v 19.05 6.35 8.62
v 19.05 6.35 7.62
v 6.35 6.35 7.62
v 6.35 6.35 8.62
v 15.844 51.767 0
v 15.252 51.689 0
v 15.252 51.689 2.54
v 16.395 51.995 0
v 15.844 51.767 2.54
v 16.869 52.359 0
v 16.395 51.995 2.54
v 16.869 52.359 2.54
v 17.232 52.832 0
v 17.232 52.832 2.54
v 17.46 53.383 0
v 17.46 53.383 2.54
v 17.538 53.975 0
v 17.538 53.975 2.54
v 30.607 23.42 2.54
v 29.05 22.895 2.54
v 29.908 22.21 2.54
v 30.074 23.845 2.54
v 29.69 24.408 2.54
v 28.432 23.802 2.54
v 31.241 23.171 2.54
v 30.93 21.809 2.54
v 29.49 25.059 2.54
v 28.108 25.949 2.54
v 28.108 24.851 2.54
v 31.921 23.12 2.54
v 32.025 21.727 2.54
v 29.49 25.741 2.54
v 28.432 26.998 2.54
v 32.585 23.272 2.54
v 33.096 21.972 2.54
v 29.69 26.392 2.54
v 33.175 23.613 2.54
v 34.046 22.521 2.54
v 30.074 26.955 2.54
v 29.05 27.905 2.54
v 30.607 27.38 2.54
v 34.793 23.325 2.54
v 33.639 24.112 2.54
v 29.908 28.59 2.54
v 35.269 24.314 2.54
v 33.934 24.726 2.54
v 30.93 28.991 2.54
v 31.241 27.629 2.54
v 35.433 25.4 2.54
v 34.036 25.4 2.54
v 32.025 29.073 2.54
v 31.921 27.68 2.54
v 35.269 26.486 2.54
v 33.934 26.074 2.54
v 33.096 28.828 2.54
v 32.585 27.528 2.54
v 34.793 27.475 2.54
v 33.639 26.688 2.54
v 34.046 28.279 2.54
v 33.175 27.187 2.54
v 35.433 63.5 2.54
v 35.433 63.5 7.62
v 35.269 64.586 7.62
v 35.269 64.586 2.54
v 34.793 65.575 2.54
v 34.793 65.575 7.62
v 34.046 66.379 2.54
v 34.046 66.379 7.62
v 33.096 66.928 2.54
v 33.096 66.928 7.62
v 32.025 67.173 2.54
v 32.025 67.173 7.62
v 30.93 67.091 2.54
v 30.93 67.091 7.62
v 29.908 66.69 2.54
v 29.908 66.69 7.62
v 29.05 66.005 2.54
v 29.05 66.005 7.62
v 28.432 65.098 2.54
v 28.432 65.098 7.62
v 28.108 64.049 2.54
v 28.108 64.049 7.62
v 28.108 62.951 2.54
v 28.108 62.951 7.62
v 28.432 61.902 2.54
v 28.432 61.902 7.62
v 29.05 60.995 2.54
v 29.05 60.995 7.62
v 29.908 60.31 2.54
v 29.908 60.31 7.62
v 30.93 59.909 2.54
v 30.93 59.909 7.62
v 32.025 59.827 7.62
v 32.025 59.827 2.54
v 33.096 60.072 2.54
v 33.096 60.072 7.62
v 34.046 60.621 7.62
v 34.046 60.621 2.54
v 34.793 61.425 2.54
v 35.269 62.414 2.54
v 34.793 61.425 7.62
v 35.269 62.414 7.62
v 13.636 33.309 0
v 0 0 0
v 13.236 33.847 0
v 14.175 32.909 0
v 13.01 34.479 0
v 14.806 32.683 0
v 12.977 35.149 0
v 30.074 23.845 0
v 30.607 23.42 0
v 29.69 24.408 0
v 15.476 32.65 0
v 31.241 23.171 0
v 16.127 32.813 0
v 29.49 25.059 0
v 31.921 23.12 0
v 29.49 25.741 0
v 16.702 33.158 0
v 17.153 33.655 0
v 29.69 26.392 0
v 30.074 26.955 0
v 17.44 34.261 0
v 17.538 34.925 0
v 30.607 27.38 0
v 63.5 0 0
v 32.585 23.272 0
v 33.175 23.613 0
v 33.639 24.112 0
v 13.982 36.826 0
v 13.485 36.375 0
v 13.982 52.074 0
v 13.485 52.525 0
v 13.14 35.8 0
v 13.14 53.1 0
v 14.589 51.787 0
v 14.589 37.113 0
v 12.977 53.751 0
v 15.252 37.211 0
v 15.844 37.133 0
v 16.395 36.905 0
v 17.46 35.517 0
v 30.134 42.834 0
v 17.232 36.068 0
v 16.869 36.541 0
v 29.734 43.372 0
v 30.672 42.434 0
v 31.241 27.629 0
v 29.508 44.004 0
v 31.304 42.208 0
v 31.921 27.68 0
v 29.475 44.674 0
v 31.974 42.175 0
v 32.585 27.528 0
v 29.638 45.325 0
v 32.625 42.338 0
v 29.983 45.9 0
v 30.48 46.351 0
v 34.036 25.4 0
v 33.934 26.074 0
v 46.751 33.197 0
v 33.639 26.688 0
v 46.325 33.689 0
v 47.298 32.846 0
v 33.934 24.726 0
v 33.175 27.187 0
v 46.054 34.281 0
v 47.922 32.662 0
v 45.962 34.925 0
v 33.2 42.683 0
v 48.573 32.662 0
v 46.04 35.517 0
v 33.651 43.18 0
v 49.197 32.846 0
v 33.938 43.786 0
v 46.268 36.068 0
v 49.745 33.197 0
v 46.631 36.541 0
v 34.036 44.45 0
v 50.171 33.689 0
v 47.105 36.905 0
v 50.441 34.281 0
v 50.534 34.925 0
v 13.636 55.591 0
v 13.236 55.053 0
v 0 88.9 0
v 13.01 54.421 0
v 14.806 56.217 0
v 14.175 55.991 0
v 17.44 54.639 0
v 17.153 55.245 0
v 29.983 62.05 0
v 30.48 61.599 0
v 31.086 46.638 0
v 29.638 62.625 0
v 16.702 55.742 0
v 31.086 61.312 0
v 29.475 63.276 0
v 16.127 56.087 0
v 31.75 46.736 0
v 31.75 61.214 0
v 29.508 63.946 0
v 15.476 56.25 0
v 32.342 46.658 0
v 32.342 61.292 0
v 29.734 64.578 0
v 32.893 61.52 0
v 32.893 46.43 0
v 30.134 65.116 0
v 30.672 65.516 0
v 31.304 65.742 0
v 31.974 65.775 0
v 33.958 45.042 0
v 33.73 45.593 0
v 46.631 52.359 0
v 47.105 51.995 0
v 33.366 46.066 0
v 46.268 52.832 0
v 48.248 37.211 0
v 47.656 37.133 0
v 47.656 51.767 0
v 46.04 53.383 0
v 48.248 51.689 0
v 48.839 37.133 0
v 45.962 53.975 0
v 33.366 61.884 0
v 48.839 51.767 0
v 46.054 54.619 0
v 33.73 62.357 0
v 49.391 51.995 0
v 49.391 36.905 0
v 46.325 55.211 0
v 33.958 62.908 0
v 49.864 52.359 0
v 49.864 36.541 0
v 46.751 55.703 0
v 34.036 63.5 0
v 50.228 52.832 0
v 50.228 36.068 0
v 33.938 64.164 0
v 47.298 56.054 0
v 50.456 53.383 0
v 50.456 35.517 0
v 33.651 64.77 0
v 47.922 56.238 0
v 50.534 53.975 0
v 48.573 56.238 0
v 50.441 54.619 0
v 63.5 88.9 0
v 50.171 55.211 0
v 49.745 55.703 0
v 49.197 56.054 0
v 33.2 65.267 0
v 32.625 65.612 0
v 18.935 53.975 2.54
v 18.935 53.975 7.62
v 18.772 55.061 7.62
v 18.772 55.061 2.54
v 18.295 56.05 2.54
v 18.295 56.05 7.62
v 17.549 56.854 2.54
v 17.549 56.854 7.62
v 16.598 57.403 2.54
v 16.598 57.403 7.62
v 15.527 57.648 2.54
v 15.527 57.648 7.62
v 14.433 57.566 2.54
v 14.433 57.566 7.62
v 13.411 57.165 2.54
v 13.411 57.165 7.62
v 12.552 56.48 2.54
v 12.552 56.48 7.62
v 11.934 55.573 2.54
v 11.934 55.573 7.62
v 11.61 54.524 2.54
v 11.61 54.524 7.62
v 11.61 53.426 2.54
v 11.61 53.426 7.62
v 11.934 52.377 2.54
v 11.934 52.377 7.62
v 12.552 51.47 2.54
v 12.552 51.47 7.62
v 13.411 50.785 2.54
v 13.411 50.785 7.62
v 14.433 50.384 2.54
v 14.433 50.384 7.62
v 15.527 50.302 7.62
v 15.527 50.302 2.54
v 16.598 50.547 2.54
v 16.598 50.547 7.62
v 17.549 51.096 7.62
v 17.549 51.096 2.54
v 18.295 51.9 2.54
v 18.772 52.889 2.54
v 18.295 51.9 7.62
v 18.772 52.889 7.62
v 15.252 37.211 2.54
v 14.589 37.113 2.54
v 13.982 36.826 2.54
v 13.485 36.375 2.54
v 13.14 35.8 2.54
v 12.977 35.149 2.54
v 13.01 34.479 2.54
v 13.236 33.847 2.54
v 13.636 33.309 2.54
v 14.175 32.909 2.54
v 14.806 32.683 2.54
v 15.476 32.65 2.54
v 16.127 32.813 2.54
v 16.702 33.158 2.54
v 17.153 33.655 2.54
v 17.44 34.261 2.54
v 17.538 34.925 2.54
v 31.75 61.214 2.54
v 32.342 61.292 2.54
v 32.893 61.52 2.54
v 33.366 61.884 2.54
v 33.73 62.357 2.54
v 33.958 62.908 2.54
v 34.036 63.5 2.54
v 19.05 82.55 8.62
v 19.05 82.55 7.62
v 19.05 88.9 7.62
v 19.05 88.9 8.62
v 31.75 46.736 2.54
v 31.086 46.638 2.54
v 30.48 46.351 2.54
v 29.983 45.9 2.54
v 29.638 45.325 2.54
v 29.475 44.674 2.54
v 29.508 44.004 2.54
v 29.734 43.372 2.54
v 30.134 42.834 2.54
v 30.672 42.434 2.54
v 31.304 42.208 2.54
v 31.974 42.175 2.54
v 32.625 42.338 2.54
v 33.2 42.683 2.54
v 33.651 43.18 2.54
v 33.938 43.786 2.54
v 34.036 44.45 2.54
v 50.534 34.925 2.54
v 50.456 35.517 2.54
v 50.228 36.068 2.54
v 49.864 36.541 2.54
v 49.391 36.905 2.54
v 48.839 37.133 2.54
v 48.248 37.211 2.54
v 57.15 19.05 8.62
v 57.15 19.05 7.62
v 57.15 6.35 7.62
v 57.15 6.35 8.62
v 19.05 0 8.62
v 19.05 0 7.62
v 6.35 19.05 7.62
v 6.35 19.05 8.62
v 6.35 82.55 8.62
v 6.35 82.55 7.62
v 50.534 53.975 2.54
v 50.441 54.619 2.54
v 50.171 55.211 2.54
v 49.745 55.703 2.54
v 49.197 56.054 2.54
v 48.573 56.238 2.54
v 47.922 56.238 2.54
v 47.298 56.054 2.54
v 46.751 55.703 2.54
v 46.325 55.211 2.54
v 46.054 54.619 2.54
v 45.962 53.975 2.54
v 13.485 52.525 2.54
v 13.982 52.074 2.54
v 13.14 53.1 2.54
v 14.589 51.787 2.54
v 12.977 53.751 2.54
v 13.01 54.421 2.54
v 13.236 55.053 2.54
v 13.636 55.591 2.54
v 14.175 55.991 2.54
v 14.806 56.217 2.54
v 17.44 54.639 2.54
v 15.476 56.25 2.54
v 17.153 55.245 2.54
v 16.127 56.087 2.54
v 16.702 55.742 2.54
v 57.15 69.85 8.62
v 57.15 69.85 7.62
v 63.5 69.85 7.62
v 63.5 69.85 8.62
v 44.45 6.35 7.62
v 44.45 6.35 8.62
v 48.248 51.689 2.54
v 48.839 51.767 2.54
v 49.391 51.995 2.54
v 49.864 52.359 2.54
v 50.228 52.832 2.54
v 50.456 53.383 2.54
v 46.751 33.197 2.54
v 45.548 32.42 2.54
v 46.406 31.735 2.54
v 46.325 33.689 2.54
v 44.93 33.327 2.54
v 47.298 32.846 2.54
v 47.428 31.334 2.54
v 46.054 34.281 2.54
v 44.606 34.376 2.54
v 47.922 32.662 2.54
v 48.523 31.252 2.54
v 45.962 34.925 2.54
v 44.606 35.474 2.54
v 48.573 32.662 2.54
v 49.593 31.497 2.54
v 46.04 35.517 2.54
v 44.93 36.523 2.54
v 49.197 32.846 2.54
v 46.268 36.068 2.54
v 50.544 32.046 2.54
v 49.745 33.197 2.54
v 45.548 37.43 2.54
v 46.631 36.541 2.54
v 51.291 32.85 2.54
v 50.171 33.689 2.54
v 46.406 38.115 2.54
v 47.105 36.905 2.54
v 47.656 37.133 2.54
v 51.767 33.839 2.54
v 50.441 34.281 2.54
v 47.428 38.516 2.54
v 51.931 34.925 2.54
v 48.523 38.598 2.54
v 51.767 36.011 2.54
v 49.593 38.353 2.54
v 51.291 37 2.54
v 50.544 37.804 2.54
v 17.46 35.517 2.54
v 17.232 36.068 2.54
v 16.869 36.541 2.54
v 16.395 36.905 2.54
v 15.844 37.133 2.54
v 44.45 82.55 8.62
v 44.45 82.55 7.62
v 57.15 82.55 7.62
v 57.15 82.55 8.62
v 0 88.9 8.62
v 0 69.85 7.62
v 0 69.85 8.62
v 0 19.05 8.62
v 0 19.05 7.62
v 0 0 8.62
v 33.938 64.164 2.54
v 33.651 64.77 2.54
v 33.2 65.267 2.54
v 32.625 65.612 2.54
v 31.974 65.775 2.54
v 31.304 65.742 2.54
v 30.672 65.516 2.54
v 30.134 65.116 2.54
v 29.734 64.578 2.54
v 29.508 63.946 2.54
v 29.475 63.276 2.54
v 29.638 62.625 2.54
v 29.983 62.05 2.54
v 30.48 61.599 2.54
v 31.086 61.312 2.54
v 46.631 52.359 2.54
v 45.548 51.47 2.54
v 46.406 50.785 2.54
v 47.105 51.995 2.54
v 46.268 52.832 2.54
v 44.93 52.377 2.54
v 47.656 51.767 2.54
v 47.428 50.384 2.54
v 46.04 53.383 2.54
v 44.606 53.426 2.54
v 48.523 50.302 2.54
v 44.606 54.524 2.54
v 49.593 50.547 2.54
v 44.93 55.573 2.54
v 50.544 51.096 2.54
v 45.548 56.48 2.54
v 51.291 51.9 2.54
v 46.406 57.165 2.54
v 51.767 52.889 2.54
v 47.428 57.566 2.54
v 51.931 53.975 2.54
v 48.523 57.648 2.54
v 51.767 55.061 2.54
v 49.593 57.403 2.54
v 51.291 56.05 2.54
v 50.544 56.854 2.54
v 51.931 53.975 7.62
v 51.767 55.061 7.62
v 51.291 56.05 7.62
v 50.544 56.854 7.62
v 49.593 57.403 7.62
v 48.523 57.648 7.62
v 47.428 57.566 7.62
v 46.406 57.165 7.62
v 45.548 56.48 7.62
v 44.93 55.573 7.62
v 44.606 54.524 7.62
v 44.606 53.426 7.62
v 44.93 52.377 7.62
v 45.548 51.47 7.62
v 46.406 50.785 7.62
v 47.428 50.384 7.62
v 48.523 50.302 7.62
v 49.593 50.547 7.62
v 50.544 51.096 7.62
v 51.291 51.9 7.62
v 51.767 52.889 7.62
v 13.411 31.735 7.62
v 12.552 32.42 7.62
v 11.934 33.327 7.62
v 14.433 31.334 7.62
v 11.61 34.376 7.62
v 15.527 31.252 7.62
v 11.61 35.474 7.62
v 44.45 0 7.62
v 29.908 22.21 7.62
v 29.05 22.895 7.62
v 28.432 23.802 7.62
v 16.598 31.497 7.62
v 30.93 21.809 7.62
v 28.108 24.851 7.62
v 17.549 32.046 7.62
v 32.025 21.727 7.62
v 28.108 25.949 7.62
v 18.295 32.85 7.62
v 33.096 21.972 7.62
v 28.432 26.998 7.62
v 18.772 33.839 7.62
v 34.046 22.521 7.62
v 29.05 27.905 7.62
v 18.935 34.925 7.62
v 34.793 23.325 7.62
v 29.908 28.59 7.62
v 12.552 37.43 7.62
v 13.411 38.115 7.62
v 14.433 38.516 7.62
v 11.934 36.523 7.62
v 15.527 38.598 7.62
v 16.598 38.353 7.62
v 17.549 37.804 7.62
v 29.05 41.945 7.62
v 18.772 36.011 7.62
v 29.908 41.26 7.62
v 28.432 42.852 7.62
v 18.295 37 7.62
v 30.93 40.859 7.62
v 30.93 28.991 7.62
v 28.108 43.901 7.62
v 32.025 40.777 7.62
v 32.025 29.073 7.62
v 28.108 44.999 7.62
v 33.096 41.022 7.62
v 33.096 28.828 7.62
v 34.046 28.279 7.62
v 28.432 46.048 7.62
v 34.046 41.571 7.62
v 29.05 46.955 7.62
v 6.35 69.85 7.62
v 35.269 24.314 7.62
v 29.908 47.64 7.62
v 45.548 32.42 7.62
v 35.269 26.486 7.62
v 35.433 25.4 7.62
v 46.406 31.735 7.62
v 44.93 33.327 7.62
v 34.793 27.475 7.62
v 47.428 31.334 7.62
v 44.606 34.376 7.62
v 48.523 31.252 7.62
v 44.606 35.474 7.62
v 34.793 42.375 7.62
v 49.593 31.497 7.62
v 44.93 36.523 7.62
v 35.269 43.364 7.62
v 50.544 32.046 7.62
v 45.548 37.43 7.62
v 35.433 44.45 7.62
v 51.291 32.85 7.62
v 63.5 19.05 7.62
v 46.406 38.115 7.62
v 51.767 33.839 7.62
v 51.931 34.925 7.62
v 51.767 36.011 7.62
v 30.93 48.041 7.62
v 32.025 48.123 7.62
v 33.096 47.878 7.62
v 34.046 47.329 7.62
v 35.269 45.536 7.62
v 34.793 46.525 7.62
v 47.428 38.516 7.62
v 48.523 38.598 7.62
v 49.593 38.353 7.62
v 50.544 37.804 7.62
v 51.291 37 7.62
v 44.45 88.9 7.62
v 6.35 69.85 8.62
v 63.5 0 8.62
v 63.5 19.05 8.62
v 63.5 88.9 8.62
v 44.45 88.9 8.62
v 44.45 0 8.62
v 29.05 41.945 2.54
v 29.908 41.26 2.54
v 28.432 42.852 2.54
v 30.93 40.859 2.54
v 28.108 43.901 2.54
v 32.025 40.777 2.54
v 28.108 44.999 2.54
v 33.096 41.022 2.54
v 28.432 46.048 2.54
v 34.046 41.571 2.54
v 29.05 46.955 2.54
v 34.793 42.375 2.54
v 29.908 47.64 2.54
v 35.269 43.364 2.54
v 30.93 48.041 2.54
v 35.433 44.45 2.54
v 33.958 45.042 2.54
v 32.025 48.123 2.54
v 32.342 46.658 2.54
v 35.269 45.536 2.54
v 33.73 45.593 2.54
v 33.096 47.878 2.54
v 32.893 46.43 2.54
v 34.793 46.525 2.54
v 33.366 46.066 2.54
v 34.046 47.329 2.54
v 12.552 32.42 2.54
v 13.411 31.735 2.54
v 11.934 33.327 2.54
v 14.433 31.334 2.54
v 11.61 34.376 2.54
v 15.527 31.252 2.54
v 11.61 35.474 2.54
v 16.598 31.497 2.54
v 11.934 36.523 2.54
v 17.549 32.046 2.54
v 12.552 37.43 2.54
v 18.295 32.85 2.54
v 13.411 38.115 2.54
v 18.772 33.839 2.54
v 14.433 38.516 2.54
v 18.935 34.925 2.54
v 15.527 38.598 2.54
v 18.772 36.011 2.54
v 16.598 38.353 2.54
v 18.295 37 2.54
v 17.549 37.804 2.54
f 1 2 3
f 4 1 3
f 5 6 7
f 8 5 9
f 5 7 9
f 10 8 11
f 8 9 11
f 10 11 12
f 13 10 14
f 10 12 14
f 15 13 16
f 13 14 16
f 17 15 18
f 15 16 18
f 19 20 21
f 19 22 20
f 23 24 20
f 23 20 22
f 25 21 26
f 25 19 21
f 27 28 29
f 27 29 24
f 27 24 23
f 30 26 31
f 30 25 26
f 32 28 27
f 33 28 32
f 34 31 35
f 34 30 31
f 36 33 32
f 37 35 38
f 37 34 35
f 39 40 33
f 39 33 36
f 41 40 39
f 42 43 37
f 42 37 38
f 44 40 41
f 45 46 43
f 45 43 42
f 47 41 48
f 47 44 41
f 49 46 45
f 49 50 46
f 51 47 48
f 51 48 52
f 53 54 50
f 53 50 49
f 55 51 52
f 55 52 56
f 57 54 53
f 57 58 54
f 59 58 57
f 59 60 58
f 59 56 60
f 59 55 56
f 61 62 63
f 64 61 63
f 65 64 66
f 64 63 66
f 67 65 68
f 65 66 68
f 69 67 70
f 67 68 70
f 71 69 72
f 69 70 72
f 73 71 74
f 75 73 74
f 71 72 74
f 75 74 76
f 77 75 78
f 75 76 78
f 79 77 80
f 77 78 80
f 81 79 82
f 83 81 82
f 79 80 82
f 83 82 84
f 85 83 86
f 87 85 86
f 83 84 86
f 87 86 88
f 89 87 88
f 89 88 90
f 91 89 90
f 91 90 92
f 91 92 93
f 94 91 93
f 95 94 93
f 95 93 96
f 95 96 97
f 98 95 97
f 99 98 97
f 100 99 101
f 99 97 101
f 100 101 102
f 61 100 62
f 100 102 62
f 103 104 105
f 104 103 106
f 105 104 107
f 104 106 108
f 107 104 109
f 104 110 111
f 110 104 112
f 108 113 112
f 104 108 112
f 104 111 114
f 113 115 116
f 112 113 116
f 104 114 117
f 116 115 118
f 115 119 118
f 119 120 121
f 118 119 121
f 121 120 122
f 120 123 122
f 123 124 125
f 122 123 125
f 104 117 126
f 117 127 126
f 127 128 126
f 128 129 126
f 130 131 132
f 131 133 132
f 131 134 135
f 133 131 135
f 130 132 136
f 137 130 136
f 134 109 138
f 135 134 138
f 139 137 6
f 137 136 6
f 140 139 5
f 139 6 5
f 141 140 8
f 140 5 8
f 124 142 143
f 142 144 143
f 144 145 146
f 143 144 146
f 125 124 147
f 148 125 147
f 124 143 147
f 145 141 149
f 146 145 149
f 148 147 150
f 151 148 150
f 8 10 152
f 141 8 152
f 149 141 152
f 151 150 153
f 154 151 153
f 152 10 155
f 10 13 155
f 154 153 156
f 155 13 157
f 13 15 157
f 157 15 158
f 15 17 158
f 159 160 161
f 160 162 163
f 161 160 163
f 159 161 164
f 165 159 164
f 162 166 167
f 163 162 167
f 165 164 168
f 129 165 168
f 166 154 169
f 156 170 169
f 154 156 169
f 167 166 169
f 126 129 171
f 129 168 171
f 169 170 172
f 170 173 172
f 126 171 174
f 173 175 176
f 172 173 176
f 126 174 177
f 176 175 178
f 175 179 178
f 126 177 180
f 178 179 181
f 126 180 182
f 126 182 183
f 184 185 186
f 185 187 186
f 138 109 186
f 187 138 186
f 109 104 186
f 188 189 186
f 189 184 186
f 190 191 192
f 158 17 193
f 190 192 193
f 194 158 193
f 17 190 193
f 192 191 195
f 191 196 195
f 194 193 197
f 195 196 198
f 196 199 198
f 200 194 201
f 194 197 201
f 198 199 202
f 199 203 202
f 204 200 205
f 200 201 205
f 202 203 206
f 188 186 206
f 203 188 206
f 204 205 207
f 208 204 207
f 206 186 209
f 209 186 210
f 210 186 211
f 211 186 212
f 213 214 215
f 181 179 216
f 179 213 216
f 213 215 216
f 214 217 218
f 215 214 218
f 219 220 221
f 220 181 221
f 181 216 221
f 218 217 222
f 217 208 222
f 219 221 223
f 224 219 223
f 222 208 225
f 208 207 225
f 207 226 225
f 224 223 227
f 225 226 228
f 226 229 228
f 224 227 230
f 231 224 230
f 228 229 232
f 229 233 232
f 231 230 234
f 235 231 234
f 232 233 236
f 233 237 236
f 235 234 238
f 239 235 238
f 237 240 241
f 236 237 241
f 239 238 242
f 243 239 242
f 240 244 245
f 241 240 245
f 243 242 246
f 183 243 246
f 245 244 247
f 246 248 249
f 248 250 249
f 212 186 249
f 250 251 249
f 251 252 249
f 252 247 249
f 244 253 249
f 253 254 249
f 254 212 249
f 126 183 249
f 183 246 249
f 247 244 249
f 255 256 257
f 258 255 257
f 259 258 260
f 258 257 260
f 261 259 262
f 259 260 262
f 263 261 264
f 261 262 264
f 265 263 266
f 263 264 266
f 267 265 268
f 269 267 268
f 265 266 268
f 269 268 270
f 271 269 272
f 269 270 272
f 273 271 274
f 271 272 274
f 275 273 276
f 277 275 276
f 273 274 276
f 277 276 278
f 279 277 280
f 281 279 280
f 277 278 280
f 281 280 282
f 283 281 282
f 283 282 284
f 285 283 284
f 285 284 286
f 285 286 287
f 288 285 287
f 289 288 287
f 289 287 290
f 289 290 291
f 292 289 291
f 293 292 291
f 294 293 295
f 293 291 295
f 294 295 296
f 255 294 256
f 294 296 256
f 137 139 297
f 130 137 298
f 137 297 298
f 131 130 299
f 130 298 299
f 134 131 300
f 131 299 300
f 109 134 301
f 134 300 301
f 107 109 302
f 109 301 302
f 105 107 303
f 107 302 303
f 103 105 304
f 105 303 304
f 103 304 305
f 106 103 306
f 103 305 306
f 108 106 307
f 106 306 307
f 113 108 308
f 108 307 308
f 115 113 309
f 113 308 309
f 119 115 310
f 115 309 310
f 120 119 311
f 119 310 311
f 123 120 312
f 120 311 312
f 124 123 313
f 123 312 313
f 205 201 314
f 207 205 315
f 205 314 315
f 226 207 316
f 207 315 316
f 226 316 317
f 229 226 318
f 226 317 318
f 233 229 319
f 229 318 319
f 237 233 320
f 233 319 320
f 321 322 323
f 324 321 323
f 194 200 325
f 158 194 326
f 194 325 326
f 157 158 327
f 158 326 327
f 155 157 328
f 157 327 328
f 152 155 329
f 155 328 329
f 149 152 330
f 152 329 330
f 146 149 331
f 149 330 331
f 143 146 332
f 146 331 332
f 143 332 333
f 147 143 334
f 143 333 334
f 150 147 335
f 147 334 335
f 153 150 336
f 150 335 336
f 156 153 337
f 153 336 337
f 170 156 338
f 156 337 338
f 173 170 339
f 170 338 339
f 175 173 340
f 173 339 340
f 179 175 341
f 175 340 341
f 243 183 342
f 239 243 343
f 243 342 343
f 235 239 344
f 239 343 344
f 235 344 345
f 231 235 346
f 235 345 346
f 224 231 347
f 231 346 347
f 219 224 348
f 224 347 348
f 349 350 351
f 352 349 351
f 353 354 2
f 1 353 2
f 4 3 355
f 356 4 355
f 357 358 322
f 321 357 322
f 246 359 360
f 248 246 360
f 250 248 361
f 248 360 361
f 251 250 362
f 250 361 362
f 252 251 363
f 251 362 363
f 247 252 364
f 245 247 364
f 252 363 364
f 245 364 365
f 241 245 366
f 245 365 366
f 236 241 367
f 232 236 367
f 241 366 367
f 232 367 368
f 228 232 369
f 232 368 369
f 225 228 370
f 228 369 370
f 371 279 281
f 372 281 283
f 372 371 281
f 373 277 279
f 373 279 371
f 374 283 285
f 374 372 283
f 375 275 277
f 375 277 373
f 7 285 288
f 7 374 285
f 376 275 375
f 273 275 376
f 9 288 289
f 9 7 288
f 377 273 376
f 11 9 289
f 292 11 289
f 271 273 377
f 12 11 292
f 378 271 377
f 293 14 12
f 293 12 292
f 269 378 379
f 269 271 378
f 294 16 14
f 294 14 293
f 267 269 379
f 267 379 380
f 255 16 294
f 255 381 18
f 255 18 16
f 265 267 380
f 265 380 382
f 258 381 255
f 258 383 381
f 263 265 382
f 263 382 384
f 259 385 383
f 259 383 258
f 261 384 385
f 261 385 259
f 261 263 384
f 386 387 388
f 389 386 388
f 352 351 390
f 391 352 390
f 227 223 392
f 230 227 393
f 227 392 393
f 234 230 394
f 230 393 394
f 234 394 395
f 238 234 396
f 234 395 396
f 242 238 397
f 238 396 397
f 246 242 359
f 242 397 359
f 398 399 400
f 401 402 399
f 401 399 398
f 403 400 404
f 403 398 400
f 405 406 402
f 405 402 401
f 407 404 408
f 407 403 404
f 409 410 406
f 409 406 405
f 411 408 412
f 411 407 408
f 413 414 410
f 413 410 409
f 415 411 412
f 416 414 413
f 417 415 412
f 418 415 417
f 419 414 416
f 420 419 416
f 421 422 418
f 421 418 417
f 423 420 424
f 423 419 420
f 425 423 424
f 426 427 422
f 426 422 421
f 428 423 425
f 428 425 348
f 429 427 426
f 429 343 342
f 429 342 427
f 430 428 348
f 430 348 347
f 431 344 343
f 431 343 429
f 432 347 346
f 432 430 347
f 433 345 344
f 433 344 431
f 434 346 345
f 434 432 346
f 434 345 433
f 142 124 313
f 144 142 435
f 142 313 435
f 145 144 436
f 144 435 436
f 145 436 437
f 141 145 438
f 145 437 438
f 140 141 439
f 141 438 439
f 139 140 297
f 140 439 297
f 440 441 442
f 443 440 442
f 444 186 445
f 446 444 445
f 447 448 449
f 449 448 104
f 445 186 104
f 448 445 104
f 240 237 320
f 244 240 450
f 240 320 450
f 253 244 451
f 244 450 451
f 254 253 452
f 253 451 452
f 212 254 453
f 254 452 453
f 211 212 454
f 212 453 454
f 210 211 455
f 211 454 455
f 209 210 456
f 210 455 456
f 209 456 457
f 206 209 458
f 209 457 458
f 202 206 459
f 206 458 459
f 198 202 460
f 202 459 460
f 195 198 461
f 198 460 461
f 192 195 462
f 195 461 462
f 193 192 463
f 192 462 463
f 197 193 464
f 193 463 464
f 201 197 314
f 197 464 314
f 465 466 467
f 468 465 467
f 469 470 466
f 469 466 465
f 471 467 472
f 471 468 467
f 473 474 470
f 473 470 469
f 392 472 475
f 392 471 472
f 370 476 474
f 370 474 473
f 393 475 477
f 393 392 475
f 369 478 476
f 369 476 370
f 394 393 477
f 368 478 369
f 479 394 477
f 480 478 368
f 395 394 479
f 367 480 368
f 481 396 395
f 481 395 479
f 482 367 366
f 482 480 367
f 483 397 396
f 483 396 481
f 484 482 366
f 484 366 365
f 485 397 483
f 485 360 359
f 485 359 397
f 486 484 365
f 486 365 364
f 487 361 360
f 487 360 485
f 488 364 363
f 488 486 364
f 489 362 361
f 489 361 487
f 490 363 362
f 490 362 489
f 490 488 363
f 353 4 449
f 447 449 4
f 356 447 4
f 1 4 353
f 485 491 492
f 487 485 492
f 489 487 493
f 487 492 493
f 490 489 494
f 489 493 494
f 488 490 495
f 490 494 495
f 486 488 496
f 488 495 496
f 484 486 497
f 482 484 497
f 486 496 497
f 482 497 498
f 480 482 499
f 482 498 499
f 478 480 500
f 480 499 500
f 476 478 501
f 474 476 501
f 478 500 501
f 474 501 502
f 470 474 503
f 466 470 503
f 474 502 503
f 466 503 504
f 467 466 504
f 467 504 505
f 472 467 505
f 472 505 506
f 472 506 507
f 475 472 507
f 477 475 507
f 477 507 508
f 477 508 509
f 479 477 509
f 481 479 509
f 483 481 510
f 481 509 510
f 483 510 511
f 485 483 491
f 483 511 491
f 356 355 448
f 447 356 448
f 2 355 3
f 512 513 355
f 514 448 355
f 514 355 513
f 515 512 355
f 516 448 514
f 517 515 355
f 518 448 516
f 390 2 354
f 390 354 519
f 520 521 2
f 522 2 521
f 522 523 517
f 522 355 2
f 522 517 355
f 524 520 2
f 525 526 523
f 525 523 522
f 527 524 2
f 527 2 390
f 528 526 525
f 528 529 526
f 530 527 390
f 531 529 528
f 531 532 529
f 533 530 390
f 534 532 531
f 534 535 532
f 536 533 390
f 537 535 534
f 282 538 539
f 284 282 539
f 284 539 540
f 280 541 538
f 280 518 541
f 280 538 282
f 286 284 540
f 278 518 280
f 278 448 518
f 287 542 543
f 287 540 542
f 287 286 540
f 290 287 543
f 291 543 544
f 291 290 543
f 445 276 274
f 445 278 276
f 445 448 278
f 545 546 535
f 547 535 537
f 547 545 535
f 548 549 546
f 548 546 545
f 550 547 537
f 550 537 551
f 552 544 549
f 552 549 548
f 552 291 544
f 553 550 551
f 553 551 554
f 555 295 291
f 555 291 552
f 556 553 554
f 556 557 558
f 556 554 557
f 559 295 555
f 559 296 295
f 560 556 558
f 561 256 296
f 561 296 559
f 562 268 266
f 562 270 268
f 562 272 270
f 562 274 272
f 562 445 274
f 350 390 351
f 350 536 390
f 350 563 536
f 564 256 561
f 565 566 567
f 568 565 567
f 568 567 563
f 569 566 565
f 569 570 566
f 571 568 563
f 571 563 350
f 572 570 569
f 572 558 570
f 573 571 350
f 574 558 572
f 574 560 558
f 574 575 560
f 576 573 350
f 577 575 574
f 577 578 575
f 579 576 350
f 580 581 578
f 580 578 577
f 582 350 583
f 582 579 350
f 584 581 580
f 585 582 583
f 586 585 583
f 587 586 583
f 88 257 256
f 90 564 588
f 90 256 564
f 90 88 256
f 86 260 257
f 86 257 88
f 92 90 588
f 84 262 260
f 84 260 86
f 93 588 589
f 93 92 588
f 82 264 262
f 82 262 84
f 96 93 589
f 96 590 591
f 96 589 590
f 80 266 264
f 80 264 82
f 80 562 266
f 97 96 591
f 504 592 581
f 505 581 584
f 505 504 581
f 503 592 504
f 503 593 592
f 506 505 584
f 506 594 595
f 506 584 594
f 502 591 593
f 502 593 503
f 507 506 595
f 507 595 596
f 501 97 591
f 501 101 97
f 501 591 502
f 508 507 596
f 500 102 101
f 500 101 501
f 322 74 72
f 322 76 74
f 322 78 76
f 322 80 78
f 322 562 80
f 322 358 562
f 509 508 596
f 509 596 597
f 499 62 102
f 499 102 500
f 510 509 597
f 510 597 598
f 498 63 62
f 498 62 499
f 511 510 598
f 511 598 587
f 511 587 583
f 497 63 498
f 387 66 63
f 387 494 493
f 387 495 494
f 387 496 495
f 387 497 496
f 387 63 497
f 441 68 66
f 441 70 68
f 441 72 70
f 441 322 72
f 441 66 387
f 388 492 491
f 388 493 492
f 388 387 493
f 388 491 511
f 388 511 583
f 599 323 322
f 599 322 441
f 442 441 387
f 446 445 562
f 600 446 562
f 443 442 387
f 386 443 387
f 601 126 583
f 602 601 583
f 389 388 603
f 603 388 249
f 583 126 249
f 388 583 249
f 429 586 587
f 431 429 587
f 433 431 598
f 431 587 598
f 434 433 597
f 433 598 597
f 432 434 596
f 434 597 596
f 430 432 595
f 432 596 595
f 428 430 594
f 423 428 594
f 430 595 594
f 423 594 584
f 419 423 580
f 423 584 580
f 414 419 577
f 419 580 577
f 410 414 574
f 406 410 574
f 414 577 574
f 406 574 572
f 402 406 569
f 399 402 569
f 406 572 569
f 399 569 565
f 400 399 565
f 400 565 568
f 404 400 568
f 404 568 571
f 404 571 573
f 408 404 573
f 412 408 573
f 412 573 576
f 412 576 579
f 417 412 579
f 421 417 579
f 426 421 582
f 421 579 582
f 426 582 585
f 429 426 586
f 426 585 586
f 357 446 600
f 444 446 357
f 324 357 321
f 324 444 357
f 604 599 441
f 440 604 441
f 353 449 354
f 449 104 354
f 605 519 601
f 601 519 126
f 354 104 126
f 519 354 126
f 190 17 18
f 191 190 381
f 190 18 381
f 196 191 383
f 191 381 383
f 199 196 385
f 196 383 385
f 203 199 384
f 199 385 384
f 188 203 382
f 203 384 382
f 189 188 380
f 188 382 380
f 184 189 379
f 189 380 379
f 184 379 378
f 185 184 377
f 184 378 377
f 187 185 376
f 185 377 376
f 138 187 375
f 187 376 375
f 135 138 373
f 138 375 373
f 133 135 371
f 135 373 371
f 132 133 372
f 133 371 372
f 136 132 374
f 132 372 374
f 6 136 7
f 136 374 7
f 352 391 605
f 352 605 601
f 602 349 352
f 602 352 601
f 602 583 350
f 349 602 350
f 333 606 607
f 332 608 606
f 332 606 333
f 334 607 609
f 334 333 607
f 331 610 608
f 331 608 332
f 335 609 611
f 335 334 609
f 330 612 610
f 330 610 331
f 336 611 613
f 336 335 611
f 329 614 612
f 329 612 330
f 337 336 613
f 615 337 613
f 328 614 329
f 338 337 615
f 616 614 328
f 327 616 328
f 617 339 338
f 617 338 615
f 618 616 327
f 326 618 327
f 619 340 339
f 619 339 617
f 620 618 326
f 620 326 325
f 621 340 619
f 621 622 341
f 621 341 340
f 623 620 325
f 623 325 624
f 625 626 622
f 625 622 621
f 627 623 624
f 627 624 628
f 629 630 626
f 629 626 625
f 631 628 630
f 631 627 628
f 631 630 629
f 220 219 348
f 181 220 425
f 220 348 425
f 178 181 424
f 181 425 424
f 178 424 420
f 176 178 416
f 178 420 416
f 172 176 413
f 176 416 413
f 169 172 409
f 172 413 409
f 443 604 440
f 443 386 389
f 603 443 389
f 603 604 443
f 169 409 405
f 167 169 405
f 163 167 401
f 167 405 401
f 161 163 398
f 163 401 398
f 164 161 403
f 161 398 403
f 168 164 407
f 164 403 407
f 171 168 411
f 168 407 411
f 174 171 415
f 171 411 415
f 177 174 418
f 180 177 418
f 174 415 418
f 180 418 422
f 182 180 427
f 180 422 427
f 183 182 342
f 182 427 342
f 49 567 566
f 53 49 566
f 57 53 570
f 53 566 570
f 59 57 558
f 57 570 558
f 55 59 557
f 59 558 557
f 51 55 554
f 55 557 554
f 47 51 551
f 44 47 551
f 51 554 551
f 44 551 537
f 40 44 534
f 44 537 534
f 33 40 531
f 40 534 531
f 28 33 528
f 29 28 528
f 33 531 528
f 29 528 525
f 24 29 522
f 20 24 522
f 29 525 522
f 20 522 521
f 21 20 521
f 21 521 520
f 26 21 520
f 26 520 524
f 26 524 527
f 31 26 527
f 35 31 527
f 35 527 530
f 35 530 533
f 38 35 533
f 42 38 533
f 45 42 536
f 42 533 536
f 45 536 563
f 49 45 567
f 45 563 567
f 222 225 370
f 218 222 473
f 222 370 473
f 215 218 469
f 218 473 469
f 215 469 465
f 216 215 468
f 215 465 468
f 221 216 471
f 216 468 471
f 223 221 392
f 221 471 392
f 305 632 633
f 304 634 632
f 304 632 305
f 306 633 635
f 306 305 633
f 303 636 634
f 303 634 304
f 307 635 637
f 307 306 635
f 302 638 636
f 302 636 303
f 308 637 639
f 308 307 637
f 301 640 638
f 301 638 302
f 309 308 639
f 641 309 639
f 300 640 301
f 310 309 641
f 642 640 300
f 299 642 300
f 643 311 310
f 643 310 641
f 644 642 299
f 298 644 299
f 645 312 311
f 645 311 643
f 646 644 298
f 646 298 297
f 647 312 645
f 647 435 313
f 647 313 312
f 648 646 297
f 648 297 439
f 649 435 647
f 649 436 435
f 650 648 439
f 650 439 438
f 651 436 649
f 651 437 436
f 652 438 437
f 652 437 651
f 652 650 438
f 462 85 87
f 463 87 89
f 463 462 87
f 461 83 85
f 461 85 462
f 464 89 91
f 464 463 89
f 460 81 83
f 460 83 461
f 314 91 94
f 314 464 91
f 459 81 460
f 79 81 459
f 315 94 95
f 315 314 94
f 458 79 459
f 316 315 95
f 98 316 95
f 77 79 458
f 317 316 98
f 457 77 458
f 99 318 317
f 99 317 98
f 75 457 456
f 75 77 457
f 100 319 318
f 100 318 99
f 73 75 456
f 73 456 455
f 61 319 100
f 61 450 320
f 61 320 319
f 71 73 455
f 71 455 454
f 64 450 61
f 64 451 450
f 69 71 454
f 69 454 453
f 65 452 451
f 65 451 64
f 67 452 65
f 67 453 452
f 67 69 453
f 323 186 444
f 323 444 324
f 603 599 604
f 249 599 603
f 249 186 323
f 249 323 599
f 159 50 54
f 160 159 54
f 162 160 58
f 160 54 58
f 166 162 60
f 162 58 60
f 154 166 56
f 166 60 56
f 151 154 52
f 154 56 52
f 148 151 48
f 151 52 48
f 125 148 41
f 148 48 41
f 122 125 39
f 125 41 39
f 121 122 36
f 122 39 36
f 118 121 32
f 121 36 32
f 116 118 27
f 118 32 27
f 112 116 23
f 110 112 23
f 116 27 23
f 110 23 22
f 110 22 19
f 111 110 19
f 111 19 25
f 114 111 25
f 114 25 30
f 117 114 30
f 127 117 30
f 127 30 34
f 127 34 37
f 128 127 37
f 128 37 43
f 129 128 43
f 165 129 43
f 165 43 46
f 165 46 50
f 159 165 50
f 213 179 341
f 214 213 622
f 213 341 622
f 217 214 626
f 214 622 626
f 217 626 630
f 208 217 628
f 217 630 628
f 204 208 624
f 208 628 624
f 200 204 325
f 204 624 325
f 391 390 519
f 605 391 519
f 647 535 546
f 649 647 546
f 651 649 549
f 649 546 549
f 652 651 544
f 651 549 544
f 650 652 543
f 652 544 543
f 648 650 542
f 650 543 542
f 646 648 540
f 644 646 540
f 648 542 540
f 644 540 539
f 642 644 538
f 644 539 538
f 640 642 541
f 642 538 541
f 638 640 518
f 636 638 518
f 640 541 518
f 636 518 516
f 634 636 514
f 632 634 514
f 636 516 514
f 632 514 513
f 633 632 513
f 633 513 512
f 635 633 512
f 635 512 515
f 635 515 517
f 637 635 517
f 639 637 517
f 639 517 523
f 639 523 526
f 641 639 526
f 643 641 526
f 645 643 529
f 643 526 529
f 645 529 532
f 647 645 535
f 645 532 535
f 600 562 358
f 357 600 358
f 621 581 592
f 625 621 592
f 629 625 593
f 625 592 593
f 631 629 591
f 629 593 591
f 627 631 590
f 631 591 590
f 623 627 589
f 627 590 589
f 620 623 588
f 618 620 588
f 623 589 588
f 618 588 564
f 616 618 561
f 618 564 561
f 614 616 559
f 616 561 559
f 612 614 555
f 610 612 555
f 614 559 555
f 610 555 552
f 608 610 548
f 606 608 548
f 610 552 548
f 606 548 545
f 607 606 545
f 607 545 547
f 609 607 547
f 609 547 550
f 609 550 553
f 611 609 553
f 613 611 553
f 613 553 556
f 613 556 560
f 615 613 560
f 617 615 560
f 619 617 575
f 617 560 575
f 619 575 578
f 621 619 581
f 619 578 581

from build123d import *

# Parameters (mm, degrees)
F0_W     = 63.5
F0_H     = 88.9
F1_DEPTH = 7.62
F2_R     = 2.286
F3_DEPTH = 25.4
F4_R     = 3.683
F4_R_2   = 2.286
F5_DEPTH = 5.08
F7_DEPTH = 1


with BuildPart() as f1:
    # F0 (on Top) → F1 (new body)
    with BuildSketch(Plane.XY):
        with Locations((31.75, 44.45)):
            Rectangle(F0_W, F0_H)
    extrude(amount=F1_DEPTH)

    # F2 (on face) → F3 (cut)
    with BuildSketch(Plane.XY.offset(7.62)):
        with BuildLine():
            ThreePointArc((34.036, 63.5), (30.1335538982, 65.1164461018), (31.75, 61.214))
            ThreePointArc((31.75, 61.214), (33.3664461018, 61.8835538982), (34.036, 63.5))
        make_face()
        with Locations((31.75, 25.4)):
            Circle(F2_R)
        with BuildLine():
            Line((48.2477839421, 34.925), (48.2477839421, 37.211))
            ThreePointArc((48.2477839421, 37.211), (46.6313378403, 36.5414461018), (45.9617839421, 34.925))
            Line((45.9617839421, 34.925), (48.2477839421, 34.925))
        make_face()
        with BuildLine():
            ThreePointArc((50.5337839421, 34.925), (49.8642300439, 36.5414461018), (48.2477839421, 37.211))
            Line((48.2477839421, 37.211), (48.2477839421, 34.925))
            Line((48.2477839421, 34.925), (45.9617839421, 34.925))
            ThreePointArc((45.9617839421, 34.925), (48.2477839421, 32.639), (50.5337839421, 34.925))
        make_face()
        with BuildLine():
            Line((48.2477839421, 53.975), (45.9617839421, 53.975))
            ThreePointArc((45.9617839421, 53.975), (46.6313378403, 52.3585538982), (48.2477839421, 51.689))
            Line((48.2477839421, 51.689), (48.2477839421, 53.975))
        make_face()
        with BuildLine():
            ThreePointArc((50.5337839421, 53.975), (48.2477839421, 56.261), (45.9617839421, 53.975))
            Line((45.9617839421, 53.975), (48.2477839421, 53.975))
            Line((48.2477839421, 53.975), (48.2477839421, 51.689))
            ThreePointArc((48.2477839421, 51.689), (49.8642300439, 52.3585538982), (50.5337839421, 53.975))
        make_face()
        with BuildLine():
            Line((15.2522160579, 53.975), (17.5382160579, 53.975))
            ThreePointArc((17.5382160579, 53.975), (13.6357699561, 55.5914461018), (15.2522160579, 51.689))
            Line((15.2522160579, 51.689), (15.2522160579, 53.975))
        make_face()
        with BuildLine():
            ThreePointArc((15.2522160579, 51.689), (16.8686621597, 52.3585538982), (17.5382160579, 53.975))
            Line((17.5382160579, 53.975), (15.2522160579, 53.975))
            Line((15.2522160579, 53.975), (15.2522160579, 51.689))
        make_face()
        with BuildLine():
            ThreePointArc((17.5382160579, 34.925), (16.8686621597, 36.5414461018), (15.2522160579, 37.211))
            Line((15.2522160579, 37.211), (15.2522160579, 34.925))
            Line((15.2522160579, 34.925), (17.5382160579, 34.925))
        make_face()
        with BuildLine():
            Line((15.2522160579, 34.925), (15.2522160579, 37.211))
            ThreePointArc((15.2522160579, 37.211), (13.6357699561, 33.3085538982), (17.5382160579, 34.925))
            Line((17.5382160579, 34.925), (15.2522160579, 34.925))
        make_face()
        with BuildLine():
            ThreePointArc((31.75, 46.736), (30.1335538982, 42.8335538982), (34.036, 44.45))
            ThreePointArc((34.036, 44.45), (33.3664461018, 46.0664461018), (31.75, 46.736))
        make_face()
    extrude(amount=-F3_DEPTH, mode=Mode.SUBTRACT)

    # F4 (on face) → F5 (cut)
    with BuildSketch(Plane.XY.offset(7.62)):
        with Locations((15.2522160579, 34.925)):
            Circle(F4_R)
        with Locations((15.2522160579, 34.925)):
            Circle(F4_R_2, mode=Mode.SUBTRACT)
        with Locations((15.2522160579, 53.975)):
            Circle(F4_R)
        with Locations((15.2522160579, 53.975)):
            Circle(F4_R_2, mode=Mode.SUBTRACT)
        with Locations((31.75, 63.5)):
            Circle(F4_R)
        with Locations((31.75, 63.5)):
            Circle(F4_R_2, mode=Mode.SUBTRACT)
        with Locations((48.2477839421, 53.975)):
            Circle(F4_R)
        with Locations((48.2477839421, 53.975)):
            Circle(F4_R_2, mode=Mode.SUBTRACT)
        with Locations((48.2477839421, 34.925)):
            Circle(F4_R)
        with Locations((48.2477839421, 34.925)):
            Circle(F4_R_2, mode=Mode.SUBTRACT)
        with Locations((31.75, 25.4)):
            Circle(F4_R)
        with Locations((31.75, 25.4)):
            Circle(F4_R_2, mode=Mode.SUBTRACT)
        with Locations((31.75, 44.45)):
            Circle(F4_R)
        with Locations((31.75, 44.45)):
            Circle(F4_R_2, mode=Mode.SUBTRACT)
    extrude(amount=-F5_DEPTH, mode=Mode.SUBTRACT)

    # F6 (on face) → F7 (join)
    with BuildSketch(Plane.XY.offset(7.62)):
        Polygon((6.35, 19.05), (0, 19.05), (0, 0), (19.05, 0), (19.05, 6.35), (6.35, 6.35), align=None)
        Polygon((44.45, 6.35), (44.45, 0), (63.5, 0), (63.5, 19.05), (57.15, 19.05), (57.15, 6.35), align=None)
        Polygon((63.5, 88.9), (44.45, 88.9), (44.45, 82.55), (57.15, 82.55), (57.15, 69.85), (63.5, 69.85), align=None)
        Polygon((0, 88.9), (0, 69.85), (6.35, 69.85), (6.35, 82.55), (19.05, 82.55), (19.05, 88.9), align=None)
    extrude(amount=F7_DEPTH)


solid = f1.part
